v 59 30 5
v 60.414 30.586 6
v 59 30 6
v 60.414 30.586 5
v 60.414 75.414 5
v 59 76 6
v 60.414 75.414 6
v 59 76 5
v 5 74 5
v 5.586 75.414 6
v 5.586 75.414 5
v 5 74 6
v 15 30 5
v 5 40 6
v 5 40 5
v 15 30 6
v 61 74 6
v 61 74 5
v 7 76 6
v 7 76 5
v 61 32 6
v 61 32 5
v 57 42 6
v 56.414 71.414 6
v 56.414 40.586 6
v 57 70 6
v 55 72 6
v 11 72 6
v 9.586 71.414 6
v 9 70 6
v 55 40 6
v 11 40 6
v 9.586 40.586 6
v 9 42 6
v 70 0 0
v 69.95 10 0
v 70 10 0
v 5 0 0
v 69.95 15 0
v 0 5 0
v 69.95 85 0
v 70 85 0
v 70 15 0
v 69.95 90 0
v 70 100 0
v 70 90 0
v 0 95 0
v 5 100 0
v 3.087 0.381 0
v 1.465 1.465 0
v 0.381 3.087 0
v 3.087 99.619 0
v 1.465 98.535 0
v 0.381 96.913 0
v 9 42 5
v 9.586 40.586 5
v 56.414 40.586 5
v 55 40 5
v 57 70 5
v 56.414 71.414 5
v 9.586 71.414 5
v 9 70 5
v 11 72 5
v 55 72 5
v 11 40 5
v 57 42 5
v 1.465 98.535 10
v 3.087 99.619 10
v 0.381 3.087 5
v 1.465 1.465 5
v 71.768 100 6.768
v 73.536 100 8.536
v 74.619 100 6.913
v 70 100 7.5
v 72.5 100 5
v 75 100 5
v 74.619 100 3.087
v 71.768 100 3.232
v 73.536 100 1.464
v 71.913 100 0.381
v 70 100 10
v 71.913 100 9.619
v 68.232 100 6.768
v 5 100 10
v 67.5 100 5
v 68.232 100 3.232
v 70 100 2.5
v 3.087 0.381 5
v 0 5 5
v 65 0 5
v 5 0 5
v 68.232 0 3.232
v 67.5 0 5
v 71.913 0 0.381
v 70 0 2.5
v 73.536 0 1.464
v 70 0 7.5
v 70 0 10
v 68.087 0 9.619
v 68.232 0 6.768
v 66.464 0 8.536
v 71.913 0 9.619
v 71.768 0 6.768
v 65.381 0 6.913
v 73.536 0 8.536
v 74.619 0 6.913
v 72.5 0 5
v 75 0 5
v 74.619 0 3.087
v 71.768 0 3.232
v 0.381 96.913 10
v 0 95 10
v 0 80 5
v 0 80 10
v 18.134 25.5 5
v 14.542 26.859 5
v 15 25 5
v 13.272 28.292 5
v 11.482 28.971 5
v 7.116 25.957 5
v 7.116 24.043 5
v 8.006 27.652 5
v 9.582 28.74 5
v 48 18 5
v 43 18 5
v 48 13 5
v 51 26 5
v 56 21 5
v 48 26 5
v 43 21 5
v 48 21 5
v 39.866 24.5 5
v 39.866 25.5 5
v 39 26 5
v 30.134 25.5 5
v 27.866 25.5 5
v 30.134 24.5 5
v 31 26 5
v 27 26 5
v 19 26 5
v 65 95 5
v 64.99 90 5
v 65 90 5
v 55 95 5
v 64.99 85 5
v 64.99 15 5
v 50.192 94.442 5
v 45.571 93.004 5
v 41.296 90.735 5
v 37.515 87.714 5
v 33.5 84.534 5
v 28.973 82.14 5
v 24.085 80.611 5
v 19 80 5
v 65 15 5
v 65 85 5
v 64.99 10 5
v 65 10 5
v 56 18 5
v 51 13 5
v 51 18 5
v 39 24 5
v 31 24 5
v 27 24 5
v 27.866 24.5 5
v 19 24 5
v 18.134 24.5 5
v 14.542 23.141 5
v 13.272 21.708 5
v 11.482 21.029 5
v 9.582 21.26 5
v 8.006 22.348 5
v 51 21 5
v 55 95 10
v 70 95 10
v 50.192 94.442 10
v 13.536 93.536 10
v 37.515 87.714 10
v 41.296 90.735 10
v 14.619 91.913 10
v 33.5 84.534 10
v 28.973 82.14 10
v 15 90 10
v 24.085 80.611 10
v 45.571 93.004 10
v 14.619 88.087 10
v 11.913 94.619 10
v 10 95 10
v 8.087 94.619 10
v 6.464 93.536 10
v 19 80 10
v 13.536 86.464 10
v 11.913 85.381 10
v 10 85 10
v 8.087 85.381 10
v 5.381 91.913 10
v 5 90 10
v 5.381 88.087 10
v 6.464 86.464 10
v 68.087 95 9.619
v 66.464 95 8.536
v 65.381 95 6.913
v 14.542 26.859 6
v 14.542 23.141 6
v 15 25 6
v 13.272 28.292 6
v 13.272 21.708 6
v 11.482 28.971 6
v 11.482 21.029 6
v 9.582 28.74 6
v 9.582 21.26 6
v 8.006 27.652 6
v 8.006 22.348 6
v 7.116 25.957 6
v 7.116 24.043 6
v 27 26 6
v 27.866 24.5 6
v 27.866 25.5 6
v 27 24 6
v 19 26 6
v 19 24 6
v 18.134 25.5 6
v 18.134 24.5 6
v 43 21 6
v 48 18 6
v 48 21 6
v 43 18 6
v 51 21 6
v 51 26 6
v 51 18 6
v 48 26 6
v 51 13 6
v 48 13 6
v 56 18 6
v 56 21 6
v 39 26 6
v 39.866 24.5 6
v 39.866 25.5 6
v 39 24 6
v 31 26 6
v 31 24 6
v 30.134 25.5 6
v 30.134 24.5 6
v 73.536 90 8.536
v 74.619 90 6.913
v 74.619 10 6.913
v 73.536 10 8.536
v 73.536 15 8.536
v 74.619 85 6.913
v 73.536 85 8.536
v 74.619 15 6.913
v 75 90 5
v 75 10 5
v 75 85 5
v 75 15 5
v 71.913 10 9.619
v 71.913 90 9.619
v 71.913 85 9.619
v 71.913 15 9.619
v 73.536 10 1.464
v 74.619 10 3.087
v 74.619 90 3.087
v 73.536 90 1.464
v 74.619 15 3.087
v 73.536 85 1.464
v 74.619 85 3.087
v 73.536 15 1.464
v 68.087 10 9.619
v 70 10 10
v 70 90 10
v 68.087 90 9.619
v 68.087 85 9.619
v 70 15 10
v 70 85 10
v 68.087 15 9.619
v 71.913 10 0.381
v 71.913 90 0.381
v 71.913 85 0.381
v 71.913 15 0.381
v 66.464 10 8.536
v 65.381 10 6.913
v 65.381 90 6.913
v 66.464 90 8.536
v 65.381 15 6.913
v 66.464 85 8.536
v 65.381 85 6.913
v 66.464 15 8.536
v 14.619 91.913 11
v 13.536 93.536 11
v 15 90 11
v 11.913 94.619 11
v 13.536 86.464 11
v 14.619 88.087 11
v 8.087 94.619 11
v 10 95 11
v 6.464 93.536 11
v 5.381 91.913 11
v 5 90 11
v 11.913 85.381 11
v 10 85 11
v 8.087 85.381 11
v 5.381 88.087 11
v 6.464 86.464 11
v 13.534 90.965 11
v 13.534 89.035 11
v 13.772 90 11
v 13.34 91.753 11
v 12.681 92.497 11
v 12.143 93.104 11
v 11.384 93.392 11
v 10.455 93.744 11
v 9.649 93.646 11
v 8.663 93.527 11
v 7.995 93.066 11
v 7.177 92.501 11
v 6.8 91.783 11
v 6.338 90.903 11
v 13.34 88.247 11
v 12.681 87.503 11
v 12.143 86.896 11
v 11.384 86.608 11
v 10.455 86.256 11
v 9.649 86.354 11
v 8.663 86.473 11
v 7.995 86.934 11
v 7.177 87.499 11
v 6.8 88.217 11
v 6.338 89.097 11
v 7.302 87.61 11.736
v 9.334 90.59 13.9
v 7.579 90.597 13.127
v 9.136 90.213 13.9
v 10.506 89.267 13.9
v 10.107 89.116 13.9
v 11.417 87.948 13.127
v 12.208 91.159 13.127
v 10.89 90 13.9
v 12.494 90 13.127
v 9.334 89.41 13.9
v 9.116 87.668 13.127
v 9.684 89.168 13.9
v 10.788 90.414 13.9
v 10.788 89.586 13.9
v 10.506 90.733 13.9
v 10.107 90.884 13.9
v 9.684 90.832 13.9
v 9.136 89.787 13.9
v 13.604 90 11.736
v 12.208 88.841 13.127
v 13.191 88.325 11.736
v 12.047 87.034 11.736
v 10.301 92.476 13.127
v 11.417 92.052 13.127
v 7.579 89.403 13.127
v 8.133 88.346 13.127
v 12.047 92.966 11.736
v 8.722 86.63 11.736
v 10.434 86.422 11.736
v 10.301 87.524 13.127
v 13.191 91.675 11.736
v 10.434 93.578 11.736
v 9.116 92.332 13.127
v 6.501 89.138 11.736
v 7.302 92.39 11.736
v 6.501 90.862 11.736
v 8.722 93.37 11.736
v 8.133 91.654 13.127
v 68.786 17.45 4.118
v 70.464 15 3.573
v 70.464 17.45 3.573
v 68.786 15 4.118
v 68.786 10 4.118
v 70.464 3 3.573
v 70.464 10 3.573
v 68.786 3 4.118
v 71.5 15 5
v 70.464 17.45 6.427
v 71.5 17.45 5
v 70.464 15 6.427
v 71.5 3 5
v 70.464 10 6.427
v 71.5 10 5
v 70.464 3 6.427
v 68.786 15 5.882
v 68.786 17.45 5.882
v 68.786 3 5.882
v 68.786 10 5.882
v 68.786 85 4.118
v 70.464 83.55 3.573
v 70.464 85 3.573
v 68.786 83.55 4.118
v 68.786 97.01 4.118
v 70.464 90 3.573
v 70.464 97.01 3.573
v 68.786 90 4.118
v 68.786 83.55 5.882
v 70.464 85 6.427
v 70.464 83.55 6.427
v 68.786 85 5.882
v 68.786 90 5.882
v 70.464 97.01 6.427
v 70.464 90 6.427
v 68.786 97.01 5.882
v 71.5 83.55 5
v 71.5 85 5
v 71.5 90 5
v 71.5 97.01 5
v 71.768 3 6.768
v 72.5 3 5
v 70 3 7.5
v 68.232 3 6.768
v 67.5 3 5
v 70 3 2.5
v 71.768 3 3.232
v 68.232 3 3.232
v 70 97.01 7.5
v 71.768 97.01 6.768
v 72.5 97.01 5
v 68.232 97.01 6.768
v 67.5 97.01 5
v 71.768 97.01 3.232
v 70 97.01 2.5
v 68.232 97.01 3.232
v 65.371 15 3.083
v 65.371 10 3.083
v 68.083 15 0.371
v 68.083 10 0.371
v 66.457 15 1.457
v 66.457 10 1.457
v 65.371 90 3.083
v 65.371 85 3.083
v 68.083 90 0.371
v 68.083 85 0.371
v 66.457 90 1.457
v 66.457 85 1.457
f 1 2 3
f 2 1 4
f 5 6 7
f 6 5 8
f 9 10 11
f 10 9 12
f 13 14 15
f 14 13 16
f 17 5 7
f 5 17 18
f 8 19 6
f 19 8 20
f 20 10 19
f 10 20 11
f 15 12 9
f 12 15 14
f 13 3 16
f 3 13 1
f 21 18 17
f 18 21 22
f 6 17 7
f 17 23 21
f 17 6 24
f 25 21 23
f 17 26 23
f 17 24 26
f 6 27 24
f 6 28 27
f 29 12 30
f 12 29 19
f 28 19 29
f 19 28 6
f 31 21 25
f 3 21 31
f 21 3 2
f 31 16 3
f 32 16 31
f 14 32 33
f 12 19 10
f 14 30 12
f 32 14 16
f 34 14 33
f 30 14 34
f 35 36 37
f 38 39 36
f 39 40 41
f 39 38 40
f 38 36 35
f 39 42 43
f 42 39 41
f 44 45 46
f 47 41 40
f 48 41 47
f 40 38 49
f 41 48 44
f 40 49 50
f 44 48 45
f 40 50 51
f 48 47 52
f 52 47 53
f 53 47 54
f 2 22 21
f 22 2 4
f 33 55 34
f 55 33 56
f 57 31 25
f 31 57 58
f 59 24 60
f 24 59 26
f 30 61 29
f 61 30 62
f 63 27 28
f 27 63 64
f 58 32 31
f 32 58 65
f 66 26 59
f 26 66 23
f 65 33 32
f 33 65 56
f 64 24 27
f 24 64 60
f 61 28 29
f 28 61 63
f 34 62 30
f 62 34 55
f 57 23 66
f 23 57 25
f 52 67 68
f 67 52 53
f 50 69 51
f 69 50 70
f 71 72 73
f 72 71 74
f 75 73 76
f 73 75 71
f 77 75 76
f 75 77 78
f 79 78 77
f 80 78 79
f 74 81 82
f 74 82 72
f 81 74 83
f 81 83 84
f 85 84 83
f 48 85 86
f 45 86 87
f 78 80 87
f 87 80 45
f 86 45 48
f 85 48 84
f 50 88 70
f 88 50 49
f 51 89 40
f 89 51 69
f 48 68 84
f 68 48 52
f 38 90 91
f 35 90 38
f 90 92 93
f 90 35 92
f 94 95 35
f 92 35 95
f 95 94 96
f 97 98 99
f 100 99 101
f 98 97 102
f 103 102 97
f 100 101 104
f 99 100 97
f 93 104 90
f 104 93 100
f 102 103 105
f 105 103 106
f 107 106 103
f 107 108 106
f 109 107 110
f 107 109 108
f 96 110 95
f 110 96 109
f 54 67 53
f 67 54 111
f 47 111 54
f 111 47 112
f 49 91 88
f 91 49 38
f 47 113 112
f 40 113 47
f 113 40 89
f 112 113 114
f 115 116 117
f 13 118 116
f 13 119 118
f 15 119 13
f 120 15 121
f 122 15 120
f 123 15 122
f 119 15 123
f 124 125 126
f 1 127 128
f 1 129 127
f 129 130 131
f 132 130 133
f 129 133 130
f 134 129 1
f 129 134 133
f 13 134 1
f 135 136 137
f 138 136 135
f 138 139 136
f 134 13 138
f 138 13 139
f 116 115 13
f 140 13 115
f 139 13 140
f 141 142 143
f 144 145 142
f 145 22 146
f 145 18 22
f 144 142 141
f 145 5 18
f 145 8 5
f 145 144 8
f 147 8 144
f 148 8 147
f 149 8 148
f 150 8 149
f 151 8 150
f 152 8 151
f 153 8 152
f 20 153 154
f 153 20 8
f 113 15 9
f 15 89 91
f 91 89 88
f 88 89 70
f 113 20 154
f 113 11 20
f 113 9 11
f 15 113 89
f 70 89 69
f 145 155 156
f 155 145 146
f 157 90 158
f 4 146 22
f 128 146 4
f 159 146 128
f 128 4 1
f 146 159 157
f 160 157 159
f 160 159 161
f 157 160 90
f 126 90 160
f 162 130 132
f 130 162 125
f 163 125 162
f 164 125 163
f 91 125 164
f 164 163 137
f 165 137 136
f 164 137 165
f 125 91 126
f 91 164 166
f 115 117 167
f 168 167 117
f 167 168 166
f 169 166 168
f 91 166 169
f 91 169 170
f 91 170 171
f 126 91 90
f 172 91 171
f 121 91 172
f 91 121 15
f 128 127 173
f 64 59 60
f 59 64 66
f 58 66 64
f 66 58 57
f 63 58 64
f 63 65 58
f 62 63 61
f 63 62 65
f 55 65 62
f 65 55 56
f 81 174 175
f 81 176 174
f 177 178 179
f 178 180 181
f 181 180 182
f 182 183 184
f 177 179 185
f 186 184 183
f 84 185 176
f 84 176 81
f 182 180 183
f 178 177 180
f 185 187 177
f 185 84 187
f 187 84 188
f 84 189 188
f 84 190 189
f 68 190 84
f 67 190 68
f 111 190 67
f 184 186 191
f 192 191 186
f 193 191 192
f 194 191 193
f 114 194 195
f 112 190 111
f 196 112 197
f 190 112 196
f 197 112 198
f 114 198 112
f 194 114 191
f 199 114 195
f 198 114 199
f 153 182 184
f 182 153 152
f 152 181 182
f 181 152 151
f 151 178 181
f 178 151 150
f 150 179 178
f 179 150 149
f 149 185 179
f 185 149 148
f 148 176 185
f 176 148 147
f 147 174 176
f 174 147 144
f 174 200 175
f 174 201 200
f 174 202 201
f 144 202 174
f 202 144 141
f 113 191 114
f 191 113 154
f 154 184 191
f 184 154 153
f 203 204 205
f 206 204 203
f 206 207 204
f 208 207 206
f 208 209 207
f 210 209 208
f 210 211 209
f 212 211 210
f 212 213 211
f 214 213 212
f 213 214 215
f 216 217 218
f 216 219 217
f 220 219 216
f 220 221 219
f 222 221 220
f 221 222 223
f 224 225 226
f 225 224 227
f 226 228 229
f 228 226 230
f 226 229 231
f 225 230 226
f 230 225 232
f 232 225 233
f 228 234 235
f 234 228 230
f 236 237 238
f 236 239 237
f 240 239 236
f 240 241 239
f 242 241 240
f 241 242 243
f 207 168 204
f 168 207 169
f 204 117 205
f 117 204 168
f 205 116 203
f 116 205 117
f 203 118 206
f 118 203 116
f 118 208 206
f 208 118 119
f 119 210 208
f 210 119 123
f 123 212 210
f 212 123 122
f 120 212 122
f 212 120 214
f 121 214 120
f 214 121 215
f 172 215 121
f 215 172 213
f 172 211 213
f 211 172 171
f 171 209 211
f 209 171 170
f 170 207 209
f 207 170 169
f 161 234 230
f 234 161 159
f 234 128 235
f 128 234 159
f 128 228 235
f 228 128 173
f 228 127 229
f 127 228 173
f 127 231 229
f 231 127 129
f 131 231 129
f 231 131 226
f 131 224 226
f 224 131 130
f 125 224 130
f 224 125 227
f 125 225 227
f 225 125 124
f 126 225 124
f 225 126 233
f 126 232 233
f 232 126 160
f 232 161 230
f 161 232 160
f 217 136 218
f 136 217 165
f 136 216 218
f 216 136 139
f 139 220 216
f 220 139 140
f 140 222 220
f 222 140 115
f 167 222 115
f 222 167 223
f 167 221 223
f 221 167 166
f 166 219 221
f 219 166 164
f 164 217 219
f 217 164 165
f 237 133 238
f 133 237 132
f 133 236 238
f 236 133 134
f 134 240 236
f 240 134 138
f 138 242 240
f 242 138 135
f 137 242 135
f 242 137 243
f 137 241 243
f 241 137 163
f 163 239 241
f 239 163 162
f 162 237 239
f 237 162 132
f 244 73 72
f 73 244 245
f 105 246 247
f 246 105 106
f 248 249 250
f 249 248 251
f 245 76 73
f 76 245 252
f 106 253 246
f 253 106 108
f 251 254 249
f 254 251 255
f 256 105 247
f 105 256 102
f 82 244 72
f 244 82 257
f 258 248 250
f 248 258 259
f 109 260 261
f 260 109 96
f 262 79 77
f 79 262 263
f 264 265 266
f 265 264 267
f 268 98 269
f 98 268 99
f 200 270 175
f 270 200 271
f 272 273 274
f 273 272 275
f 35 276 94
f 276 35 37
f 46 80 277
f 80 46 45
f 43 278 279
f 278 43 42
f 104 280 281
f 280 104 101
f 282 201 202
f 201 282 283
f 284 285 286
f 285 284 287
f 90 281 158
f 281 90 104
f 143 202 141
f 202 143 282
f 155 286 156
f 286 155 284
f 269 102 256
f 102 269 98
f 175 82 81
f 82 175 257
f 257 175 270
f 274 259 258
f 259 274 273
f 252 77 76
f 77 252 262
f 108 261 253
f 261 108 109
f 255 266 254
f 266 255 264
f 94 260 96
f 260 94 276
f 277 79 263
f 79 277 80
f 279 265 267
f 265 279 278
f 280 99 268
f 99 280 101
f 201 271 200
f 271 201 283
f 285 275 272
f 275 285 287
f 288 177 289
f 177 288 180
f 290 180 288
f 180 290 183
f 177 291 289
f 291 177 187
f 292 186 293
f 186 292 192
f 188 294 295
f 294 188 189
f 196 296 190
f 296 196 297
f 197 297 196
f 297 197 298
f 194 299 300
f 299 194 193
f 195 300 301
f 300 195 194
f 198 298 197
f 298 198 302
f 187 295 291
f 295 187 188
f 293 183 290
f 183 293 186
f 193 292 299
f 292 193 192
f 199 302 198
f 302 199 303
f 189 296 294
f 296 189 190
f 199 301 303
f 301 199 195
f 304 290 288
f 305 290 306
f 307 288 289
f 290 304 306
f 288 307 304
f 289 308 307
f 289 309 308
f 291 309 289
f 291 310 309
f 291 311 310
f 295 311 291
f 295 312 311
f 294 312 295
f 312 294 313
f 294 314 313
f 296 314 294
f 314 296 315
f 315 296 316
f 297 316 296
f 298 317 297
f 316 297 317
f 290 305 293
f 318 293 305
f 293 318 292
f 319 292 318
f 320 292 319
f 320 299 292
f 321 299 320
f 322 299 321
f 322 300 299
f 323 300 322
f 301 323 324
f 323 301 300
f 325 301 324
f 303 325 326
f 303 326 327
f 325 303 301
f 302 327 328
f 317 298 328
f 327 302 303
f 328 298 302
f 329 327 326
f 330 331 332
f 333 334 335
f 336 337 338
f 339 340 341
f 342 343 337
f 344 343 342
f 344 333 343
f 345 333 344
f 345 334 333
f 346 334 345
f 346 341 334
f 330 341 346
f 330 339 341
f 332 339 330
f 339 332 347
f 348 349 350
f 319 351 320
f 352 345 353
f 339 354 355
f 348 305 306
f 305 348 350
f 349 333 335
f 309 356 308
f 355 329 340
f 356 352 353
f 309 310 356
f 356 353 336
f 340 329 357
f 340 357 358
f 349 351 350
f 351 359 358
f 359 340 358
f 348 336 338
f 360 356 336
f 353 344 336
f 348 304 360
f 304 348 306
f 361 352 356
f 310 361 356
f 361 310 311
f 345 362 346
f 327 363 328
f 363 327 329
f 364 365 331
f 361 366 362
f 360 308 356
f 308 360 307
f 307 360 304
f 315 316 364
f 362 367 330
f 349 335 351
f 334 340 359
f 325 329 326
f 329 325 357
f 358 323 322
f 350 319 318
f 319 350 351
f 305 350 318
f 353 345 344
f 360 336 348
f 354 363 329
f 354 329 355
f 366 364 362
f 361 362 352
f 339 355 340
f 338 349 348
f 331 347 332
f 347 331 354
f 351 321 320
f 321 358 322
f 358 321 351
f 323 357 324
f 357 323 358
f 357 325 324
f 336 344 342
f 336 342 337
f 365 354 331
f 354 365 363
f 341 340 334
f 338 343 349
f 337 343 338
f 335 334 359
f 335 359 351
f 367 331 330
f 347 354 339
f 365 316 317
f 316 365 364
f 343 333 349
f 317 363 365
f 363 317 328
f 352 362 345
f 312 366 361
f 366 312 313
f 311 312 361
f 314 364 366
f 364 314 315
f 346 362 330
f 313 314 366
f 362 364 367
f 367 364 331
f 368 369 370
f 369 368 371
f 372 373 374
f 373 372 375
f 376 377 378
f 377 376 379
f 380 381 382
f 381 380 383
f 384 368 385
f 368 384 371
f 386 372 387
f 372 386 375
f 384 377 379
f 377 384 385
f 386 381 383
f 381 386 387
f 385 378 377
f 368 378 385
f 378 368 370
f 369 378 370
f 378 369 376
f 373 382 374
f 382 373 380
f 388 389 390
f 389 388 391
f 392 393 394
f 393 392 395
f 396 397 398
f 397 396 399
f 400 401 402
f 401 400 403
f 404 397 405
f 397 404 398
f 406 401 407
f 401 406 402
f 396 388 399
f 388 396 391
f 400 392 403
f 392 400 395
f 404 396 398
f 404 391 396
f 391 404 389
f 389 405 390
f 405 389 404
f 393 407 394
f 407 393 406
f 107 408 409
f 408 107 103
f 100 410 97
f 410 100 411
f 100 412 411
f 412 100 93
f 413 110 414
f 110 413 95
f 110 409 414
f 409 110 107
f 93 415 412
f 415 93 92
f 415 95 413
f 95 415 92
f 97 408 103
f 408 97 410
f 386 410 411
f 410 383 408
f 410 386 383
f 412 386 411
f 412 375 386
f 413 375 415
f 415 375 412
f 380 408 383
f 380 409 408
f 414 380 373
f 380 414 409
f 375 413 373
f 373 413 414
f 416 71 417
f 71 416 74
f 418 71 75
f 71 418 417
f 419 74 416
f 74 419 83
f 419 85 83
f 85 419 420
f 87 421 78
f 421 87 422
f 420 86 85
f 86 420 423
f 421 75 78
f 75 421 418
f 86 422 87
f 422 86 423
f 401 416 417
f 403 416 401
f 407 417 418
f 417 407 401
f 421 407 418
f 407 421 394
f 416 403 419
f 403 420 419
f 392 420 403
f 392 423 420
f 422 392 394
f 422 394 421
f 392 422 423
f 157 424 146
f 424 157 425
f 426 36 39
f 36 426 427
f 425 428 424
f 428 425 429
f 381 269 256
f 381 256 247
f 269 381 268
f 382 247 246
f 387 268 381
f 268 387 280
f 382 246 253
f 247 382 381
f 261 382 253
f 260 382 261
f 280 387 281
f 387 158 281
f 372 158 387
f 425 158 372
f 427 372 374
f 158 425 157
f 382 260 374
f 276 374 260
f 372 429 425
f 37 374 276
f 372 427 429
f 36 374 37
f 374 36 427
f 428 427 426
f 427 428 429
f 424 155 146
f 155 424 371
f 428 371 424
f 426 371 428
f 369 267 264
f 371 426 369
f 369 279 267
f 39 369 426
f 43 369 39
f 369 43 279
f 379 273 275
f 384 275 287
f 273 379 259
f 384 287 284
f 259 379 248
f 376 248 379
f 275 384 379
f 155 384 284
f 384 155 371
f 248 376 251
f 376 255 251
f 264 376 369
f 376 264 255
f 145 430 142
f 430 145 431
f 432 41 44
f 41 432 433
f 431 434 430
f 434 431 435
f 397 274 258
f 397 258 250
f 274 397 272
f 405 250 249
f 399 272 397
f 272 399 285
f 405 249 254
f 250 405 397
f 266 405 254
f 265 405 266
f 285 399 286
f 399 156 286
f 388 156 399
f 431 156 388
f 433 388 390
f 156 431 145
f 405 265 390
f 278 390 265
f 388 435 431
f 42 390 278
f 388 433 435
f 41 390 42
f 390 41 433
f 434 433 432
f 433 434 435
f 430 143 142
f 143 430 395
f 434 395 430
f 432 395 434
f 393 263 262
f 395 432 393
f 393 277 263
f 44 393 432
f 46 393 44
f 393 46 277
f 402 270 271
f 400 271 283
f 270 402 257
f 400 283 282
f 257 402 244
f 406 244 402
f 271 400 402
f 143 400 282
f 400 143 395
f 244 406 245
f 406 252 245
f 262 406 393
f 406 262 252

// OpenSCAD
module blankpokedex(){
linear_extrude(height =5)
import("PrintableLeft.dxf",layer="01Base");
linear_extrude(height =10)
import("PrintableLeft.dxf",layer="02TopTrim");
linear_extrude(height =6)
import("PrintableLeft2.dxf",layer="05Buttons");
difference(){
linear_extrude(height =6)
import("PrintableLeft.dxf",layer="03Screen");
linear_extrude(height =7)
import("PrintableLeft2.dxf",layer="04ScreenIndent");
}
rotate(a=[90,0,0])
translate(v=[70,5,-50])
cylinder(r=5,h=100,center=true);
translate(v=[10,90,0])
cylinder(r=5,h=11);
translate(v=[10,90,10])
sphere(r=4,center=true);
}

difference(){
blankpokedex();
translate(v=[70,8.7,5])
rotate(a=[90,0,0])
cylinder(r=1.5,h=17.5,center=true);
translate(v=[70,92.3,5])
rotate(a=[90,0,0])
cylinder(r=1.5,h=17.5,center=true);
translate(v=[70,1.5,5])
rotate(a=[90,0,0])
cylinder(r=2.5,h=3,center=true);
translate(v=[70,98.51,5])
rotate(a=[90,0,0])
cylinder(r=2.5,h=3,center=true);
translate(v=[70,12.5,5])
rotate(a=[90,0,0])
cylinder(r=5.01,h=5,center=true);
translate(v=[70,87.5,5])
rotate(a=[90,0,0])
cylinder(r=5.01,h=5,center=true);
}
